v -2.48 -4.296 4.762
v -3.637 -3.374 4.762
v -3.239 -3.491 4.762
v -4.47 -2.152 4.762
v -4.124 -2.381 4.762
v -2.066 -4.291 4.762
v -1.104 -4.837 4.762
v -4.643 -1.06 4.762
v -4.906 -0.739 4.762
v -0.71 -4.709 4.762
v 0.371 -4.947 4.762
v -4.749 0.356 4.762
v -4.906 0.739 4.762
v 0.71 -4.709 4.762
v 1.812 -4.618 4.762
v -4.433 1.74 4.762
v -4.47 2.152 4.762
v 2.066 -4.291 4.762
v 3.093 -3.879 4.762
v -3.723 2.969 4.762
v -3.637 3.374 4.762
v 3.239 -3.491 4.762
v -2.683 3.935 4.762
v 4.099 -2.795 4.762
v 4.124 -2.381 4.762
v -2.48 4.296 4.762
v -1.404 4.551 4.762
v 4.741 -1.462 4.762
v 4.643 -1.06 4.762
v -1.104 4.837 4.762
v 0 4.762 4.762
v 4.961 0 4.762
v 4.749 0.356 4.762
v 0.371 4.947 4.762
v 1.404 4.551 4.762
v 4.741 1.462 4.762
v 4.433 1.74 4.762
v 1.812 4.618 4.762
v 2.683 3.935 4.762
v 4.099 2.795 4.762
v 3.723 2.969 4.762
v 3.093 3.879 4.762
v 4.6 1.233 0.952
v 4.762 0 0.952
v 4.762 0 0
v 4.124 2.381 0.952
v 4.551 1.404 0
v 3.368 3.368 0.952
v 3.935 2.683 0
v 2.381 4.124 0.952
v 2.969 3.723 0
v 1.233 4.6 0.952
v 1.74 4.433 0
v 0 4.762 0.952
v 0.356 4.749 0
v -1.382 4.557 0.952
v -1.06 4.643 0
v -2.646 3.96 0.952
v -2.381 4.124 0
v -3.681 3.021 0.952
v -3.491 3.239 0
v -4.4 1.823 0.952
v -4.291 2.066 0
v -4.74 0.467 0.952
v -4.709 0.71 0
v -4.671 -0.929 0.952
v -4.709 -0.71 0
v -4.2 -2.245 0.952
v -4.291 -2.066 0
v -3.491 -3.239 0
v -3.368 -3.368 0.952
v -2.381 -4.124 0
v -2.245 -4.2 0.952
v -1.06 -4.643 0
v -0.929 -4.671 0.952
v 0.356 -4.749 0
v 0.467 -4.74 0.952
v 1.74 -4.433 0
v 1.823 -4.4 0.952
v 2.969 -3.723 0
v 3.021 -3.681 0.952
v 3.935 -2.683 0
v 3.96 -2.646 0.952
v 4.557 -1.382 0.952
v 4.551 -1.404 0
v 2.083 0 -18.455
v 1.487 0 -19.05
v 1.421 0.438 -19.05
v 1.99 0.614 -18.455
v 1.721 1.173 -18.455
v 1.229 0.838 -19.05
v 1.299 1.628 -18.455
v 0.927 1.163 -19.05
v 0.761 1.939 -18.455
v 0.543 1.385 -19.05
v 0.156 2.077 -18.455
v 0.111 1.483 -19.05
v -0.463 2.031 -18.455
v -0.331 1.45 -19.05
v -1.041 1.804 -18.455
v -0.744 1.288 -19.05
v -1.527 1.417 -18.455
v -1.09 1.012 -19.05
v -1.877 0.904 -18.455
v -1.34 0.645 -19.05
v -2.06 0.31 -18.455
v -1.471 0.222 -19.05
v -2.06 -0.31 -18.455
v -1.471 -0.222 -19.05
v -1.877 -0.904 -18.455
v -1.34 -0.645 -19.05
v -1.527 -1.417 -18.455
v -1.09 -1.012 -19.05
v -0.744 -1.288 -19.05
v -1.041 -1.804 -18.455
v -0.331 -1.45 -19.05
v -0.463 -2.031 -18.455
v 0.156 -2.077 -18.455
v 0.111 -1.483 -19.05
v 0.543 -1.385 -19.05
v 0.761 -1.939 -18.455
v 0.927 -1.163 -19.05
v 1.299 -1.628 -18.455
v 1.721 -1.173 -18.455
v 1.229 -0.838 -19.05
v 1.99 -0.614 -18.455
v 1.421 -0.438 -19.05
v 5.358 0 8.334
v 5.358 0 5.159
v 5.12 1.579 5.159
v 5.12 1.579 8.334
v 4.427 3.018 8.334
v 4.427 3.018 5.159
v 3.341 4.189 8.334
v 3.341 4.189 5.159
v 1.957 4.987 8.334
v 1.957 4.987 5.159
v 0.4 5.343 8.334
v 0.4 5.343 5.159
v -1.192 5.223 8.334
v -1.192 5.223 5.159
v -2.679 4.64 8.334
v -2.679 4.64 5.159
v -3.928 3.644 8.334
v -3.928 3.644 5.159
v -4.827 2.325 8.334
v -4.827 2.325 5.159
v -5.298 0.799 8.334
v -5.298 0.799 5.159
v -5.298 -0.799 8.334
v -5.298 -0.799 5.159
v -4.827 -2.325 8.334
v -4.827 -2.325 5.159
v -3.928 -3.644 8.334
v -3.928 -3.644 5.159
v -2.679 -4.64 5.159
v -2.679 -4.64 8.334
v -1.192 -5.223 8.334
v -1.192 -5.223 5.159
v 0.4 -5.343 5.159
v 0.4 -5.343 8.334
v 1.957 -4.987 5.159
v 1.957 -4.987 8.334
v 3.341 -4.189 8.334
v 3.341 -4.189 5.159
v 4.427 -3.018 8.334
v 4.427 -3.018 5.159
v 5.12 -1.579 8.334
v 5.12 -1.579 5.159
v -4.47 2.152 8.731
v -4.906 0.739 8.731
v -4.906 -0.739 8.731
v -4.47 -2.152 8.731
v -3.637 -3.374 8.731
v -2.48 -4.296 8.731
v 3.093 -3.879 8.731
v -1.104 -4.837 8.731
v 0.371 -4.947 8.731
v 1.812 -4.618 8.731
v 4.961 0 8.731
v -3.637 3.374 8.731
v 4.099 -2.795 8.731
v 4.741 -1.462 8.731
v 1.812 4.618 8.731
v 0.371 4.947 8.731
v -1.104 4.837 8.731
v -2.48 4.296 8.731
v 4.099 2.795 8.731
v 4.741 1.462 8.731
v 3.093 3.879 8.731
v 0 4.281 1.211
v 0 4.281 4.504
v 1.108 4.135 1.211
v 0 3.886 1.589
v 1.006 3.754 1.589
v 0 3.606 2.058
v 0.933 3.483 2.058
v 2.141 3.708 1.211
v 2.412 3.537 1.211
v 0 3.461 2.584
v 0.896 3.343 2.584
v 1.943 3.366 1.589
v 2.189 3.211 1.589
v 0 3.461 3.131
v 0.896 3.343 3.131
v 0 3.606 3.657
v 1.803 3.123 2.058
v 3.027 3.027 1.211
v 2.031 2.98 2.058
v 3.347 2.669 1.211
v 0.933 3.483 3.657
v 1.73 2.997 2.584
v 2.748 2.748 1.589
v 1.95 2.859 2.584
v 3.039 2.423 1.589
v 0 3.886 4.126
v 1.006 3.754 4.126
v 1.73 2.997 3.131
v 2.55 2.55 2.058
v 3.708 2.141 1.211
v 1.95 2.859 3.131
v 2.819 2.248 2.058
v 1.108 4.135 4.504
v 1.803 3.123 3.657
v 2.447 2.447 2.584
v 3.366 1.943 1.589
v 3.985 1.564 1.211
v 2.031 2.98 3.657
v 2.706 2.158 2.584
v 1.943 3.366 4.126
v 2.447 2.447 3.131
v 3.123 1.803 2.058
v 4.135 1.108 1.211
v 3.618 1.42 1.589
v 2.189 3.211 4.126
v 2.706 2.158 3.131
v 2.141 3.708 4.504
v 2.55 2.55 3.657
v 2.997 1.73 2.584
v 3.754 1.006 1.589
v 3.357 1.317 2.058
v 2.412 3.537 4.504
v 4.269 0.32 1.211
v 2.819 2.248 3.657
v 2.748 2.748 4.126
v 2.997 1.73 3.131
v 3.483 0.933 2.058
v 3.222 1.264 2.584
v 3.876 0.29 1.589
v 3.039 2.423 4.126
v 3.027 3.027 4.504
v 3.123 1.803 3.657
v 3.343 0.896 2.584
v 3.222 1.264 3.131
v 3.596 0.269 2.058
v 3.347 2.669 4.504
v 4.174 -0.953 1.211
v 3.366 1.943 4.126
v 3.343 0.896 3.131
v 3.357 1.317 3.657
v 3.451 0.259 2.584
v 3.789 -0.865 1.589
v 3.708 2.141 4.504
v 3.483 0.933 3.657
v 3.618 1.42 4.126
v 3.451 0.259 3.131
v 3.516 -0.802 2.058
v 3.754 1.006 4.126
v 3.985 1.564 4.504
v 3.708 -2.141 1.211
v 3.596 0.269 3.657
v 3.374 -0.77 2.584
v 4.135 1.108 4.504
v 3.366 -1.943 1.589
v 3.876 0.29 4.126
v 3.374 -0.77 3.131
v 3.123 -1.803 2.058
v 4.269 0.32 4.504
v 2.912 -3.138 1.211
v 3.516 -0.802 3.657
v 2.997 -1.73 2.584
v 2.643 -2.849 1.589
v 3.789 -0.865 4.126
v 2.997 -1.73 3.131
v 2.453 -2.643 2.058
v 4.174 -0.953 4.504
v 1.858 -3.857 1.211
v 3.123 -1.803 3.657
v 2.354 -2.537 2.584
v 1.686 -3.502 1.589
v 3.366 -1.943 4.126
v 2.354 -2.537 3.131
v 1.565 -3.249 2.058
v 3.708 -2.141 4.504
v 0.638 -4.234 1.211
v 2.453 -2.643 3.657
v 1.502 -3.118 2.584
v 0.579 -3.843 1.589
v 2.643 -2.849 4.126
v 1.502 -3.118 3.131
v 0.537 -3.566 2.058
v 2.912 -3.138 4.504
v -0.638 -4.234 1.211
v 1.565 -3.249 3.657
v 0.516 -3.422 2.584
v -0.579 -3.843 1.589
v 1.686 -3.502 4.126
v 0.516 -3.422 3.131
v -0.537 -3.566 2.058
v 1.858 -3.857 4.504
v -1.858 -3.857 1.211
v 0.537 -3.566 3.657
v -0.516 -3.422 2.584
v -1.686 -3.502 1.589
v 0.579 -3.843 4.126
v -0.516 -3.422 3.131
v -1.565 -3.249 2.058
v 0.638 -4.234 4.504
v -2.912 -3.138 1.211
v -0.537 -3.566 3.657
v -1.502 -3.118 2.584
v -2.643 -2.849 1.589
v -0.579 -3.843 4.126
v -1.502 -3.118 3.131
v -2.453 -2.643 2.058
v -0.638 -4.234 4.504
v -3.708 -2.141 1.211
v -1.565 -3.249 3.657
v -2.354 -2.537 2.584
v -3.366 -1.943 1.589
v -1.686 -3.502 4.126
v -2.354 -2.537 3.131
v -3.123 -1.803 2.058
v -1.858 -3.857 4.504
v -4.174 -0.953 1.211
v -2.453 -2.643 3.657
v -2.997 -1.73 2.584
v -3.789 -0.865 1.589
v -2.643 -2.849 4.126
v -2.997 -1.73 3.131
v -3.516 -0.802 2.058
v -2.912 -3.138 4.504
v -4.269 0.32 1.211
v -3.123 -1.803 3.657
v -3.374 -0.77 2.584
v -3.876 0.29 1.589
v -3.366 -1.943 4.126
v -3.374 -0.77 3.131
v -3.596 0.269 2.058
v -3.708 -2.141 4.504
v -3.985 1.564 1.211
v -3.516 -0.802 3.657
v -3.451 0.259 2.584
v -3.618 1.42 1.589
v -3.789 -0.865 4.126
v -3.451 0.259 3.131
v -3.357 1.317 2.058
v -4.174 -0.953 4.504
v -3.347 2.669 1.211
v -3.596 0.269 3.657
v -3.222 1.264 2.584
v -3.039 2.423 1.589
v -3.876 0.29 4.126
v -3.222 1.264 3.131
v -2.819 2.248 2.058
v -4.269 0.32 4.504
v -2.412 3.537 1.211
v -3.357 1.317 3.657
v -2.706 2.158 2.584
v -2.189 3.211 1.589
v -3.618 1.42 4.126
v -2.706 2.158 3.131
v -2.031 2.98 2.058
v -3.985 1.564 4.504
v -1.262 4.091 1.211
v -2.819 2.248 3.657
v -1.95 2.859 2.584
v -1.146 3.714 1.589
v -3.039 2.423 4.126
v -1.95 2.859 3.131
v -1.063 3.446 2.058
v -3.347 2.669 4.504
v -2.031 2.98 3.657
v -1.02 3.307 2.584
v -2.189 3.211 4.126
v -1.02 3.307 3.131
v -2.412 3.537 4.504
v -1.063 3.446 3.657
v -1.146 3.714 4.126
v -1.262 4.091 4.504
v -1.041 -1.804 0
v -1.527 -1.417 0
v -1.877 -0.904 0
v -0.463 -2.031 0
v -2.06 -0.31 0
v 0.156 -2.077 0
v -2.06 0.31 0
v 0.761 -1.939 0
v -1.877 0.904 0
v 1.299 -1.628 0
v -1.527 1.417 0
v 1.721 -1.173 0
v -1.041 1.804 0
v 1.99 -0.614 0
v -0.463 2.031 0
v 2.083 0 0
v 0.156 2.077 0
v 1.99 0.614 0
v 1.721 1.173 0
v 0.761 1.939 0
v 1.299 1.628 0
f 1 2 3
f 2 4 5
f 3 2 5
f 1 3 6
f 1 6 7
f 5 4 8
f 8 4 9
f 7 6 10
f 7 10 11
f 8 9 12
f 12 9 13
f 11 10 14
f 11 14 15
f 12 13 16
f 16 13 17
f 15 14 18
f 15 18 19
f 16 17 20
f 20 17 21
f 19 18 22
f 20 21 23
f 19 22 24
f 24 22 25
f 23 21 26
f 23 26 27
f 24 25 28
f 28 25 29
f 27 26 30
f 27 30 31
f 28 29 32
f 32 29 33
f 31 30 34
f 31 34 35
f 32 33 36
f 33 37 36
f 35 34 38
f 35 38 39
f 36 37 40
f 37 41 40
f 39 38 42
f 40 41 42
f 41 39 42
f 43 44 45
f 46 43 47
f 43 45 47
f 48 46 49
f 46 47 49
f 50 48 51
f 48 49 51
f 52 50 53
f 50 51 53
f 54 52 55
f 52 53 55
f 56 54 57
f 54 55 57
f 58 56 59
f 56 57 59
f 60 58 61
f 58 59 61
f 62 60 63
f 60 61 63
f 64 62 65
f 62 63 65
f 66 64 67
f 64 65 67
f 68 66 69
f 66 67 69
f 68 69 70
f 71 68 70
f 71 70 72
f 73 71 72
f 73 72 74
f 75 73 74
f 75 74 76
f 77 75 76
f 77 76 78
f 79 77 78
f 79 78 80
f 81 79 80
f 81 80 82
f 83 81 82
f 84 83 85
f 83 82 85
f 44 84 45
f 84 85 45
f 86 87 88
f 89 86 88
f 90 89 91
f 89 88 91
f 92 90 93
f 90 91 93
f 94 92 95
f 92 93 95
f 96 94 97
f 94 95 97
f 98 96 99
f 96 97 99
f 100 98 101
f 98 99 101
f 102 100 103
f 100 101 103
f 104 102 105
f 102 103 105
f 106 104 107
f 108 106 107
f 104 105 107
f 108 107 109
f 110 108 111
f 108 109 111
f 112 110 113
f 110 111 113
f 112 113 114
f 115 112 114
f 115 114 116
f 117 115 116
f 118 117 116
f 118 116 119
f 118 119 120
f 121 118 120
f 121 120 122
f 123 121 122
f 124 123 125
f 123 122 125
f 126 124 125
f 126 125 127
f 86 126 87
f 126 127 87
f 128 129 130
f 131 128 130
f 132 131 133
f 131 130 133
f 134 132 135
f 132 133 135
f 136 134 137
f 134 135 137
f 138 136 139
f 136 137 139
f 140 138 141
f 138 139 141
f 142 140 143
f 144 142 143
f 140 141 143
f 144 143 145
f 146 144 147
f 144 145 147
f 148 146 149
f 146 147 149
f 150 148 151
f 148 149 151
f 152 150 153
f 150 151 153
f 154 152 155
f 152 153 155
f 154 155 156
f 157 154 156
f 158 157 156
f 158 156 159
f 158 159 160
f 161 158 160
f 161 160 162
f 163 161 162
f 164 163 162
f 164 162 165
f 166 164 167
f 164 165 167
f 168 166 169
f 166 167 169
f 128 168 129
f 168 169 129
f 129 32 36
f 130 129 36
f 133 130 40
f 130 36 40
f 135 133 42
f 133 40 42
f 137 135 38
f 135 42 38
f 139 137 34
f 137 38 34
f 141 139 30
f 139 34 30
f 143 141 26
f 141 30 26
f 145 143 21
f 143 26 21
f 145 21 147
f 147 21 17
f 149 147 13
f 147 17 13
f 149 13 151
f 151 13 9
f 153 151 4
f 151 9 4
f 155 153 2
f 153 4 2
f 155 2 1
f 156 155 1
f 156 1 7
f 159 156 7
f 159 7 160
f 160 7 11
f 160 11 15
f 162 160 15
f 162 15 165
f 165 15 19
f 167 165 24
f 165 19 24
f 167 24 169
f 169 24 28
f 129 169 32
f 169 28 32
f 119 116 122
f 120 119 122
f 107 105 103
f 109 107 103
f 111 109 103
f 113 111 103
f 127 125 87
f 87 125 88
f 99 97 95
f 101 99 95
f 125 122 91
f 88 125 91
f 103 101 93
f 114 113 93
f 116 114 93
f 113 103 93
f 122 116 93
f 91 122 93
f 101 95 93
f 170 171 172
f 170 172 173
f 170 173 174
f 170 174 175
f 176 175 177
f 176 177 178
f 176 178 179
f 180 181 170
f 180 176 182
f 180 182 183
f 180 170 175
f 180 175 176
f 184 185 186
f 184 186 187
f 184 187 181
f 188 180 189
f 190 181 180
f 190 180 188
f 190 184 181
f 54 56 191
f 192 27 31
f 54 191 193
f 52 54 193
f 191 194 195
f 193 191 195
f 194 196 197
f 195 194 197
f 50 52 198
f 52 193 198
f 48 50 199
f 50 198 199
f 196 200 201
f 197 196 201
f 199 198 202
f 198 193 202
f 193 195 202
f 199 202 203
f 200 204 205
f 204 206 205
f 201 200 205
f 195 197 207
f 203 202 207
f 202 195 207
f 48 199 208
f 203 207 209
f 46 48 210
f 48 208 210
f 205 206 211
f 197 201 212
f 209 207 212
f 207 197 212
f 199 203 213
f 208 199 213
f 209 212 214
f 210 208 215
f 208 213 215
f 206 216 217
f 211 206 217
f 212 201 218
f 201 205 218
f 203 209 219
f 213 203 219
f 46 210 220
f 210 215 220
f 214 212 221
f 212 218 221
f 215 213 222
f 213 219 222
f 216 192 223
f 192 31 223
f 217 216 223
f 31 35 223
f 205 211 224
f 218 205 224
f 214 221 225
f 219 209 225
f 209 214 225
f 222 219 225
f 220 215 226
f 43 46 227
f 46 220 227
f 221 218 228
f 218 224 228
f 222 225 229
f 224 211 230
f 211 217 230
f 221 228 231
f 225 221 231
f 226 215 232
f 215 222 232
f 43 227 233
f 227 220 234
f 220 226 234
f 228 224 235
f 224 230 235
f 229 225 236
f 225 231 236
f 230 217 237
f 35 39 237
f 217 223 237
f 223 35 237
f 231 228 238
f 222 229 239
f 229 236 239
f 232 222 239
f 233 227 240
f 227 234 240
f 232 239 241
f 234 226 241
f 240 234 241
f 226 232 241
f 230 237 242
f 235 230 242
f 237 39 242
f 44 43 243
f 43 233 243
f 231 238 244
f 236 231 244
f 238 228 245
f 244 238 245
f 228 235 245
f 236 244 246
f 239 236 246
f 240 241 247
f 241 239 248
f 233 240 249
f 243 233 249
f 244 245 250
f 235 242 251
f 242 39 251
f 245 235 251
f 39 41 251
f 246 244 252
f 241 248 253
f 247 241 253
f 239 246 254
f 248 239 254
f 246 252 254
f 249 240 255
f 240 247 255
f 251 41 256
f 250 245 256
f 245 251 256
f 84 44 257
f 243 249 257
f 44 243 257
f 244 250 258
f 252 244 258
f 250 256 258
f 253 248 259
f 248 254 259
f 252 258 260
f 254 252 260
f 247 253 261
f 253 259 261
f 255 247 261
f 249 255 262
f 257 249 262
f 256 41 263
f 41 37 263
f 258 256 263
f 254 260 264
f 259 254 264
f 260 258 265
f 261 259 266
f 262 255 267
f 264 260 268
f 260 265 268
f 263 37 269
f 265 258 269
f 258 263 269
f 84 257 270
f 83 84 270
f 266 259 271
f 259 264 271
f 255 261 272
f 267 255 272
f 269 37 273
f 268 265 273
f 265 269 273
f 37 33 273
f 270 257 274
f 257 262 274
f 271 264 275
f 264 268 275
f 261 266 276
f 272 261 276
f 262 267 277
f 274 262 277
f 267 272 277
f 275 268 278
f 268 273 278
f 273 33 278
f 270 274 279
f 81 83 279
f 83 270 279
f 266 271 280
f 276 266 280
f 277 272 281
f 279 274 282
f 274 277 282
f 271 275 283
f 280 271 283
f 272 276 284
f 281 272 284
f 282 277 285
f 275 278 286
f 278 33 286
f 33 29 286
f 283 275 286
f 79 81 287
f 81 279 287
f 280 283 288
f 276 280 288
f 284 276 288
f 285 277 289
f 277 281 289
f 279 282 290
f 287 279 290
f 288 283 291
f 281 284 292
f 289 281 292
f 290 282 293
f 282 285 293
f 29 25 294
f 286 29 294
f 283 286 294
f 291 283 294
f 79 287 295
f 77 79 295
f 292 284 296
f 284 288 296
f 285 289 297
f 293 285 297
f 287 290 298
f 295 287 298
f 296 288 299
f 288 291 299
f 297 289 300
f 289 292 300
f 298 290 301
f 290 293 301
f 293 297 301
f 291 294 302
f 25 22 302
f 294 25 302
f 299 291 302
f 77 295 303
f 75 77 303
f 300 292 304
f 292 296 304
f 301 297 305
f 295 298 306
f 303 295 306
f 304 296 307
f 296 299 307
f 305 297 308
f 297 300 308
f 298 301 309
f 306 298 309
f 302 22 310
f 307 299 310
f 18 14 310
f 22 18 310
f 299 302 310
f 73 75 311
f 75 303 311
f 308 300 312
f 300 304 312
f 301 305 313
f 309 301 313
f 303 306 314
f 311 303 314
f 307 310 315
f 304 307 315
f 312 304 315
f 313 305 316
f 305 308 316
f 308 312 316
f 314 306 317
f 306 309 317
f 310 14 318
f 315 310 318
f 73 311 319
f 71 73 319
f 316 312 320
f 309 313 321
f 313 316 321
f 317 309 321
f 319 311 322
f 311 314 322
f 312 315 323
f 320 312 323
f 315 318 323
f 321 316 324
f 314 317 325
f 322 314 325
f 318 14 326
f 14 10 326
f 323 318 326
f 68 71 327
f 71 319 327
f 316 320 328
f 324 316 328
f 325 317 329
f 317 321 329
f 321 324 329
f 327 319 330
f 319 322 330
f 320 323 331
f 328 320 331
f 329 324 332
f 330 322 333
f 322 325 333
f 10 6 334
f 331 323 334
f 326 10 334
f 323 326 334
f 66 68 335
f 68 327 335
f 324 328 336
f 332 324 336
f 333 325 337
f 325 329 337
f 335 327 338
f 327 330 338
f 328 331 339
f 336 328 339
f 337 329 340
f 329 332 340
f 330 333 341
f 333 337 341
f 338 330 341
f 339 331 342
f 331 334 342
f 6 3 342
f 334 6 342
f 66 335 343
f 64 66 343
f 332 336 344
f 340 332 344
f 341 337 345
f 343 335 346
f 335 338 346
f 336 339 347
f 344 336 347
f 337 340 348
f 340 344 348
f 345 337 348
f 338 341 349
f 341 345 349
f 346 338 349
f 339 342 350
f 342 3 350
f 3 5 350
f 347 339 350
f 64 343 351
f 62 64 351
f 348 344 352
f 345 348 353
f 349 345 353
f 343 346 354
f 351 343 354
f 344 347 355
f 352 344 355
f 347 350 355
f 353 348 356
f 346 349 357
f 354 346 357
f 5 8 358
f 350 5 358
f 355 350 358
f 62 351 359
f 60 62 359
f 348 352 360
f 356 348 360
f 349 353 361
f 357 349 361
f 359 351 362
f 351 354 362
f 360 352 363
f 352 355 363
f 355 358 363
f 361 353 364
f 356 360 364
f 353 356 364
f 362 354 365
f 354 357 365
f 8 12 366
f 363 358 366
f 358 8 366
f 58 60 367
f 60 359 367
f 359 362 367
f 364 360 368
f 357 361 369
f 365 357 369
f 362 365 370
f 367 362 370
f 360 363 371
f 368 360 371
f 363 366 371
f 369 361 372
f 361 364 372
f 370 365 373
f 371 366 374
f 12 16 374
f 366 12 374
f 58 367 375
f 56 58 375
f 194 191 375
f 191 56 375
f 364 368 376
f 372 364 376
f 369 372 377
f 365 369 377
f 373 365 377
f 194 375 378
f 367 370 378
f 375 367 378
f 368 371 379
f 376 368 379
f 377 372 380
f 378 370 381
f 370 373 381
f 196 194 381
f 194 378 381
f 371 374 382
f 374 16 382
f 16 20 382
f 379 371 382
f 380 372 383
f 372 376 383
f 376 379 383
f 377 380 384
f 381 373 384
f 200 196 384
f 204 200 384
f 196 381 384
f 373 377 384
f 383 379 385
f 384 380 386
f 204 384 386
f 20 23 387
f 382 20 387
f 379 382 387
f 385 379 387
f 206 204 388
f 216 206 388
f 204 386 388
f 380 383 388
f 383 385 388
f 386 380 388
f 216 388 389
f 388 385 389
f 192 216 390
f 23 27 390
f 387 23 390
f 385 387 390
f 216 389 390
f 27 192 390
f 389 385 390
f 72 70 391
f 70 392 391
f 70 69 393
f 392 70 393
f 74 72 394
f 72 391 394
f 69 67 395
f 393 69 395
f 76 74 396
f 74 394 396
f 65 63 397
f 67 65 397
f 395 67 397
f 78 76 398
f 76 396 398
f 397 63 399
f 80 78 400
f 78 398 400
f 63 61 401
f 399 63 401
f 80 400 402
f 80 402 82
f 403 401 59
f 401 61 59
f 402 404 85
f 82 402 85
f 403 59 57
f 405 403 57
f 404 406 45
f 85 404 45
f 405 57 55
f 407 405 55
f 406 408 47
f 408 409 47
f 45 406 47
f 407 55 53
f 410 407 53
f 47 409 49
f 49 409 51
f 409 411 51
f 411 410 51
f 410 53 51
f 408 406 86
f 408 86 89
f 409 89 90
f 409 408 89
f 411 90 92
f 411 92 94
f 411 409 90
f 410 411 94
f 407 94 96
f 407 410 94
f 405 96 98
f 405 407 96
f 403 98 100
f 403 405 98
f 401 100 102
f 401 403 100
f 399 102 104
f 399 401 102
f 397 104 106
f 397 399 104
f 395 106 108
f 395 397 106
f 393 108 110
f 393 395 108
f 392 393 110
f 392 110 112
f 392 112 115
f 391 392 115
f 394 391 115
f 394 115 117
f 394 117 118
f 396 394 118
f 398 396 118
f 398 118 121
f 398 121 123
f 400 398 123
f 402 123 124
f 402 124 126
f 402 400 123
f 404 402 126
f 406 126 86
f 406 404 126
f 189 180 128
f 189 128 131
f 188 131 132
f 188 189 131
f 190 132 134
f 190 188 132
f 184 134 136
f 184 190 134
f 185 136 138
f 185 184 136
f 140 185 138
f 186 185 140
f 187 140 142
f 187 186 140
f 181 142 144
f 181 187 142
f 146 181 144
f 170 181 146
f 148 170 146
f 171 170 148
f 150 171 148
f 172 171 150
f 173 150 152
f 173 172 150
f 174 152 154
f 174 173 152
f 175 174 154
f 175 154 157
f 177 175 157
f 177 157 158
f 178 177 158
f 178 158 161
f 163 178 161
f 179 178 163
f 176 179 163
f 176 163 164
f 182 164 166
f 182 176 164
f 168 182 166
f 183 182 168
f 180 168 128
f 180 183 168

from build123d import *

# Parameters (mm, degrees)
SKETCH1_R           = 2.0828
EXTRUDE1_DEPTH      = 19.05
CHAMFER2_SIZE       = 0.5953125
SKETCH27_R          = 4.7625
BOSS_EXTRUDE4_DEPTH = 4.7625
SKETCH21_R          = 5.3578125
BOSS_EXTRUDE1_DEPTH = 3.96875
CHAMFER3_SIZE       = 0.396875


with BuildPart() as part:
    # Sketch1 → Extrude1 (new body)
    with BuildSketch(Plane.XY):
        Circle(SKETCH1_R)
    extrude(amount=-EXTRUDE1_DEPTH)

    # Chamfer2
    chamfer2_edges = [part.edges().sort_by_distance(p)[0] for p in [
        (-2.0828, 0, -19.05),
    ]]
    chamfer(chamfer2_edges, length=CHAMFER2_SIZE)

    # Sketch27 → Boss-Extrude4 (add)
    with BuildSketch(Plane.XY):
        Circle(SKETCH27_R)
    extrude(amount=BOSS_EXTRUDE4_DEPTH)

    # Sketch21 → Boss-Extrude1 (add)
    with BuildSketch(Plane.XY.offset(4.7625)):
        Circle(SKETCH21_R)
    extrude(amount=BOSS_EXTRUDE1_DEPTH)

    # Sketch28 → Cut-Revolve1 (revolve, cut)
    with BuildSketch(Plane(origin=(0, 0, 0), x_dir=(0, 0, -1), z_dir=(1, 0, 0))):
        with BuildLine():
            Line((-4.7625, 4.7625), (-0.9525, 4.7625))
            ThreePointArc((-0.9525, 4.7625), (-2.8575, 3.442334108), (-4.7625, 4.7625))
        make_face()
    revolve(axis=Axis((0, 0, 0), (0, 0, -1)), mode=Mode.SUBTRACT)

    # Chamfer3
    chamfer3_edges = [part.edges().sort_by_distance(p)[0] for p in [
        (-5.3578125, 0, 4.7625),
        (-5.3578125, 0, 8.73125),
    ]]
    chamfer(chamfer3_edges, length=CHAMFER3_SIZE)


solid = part.part
